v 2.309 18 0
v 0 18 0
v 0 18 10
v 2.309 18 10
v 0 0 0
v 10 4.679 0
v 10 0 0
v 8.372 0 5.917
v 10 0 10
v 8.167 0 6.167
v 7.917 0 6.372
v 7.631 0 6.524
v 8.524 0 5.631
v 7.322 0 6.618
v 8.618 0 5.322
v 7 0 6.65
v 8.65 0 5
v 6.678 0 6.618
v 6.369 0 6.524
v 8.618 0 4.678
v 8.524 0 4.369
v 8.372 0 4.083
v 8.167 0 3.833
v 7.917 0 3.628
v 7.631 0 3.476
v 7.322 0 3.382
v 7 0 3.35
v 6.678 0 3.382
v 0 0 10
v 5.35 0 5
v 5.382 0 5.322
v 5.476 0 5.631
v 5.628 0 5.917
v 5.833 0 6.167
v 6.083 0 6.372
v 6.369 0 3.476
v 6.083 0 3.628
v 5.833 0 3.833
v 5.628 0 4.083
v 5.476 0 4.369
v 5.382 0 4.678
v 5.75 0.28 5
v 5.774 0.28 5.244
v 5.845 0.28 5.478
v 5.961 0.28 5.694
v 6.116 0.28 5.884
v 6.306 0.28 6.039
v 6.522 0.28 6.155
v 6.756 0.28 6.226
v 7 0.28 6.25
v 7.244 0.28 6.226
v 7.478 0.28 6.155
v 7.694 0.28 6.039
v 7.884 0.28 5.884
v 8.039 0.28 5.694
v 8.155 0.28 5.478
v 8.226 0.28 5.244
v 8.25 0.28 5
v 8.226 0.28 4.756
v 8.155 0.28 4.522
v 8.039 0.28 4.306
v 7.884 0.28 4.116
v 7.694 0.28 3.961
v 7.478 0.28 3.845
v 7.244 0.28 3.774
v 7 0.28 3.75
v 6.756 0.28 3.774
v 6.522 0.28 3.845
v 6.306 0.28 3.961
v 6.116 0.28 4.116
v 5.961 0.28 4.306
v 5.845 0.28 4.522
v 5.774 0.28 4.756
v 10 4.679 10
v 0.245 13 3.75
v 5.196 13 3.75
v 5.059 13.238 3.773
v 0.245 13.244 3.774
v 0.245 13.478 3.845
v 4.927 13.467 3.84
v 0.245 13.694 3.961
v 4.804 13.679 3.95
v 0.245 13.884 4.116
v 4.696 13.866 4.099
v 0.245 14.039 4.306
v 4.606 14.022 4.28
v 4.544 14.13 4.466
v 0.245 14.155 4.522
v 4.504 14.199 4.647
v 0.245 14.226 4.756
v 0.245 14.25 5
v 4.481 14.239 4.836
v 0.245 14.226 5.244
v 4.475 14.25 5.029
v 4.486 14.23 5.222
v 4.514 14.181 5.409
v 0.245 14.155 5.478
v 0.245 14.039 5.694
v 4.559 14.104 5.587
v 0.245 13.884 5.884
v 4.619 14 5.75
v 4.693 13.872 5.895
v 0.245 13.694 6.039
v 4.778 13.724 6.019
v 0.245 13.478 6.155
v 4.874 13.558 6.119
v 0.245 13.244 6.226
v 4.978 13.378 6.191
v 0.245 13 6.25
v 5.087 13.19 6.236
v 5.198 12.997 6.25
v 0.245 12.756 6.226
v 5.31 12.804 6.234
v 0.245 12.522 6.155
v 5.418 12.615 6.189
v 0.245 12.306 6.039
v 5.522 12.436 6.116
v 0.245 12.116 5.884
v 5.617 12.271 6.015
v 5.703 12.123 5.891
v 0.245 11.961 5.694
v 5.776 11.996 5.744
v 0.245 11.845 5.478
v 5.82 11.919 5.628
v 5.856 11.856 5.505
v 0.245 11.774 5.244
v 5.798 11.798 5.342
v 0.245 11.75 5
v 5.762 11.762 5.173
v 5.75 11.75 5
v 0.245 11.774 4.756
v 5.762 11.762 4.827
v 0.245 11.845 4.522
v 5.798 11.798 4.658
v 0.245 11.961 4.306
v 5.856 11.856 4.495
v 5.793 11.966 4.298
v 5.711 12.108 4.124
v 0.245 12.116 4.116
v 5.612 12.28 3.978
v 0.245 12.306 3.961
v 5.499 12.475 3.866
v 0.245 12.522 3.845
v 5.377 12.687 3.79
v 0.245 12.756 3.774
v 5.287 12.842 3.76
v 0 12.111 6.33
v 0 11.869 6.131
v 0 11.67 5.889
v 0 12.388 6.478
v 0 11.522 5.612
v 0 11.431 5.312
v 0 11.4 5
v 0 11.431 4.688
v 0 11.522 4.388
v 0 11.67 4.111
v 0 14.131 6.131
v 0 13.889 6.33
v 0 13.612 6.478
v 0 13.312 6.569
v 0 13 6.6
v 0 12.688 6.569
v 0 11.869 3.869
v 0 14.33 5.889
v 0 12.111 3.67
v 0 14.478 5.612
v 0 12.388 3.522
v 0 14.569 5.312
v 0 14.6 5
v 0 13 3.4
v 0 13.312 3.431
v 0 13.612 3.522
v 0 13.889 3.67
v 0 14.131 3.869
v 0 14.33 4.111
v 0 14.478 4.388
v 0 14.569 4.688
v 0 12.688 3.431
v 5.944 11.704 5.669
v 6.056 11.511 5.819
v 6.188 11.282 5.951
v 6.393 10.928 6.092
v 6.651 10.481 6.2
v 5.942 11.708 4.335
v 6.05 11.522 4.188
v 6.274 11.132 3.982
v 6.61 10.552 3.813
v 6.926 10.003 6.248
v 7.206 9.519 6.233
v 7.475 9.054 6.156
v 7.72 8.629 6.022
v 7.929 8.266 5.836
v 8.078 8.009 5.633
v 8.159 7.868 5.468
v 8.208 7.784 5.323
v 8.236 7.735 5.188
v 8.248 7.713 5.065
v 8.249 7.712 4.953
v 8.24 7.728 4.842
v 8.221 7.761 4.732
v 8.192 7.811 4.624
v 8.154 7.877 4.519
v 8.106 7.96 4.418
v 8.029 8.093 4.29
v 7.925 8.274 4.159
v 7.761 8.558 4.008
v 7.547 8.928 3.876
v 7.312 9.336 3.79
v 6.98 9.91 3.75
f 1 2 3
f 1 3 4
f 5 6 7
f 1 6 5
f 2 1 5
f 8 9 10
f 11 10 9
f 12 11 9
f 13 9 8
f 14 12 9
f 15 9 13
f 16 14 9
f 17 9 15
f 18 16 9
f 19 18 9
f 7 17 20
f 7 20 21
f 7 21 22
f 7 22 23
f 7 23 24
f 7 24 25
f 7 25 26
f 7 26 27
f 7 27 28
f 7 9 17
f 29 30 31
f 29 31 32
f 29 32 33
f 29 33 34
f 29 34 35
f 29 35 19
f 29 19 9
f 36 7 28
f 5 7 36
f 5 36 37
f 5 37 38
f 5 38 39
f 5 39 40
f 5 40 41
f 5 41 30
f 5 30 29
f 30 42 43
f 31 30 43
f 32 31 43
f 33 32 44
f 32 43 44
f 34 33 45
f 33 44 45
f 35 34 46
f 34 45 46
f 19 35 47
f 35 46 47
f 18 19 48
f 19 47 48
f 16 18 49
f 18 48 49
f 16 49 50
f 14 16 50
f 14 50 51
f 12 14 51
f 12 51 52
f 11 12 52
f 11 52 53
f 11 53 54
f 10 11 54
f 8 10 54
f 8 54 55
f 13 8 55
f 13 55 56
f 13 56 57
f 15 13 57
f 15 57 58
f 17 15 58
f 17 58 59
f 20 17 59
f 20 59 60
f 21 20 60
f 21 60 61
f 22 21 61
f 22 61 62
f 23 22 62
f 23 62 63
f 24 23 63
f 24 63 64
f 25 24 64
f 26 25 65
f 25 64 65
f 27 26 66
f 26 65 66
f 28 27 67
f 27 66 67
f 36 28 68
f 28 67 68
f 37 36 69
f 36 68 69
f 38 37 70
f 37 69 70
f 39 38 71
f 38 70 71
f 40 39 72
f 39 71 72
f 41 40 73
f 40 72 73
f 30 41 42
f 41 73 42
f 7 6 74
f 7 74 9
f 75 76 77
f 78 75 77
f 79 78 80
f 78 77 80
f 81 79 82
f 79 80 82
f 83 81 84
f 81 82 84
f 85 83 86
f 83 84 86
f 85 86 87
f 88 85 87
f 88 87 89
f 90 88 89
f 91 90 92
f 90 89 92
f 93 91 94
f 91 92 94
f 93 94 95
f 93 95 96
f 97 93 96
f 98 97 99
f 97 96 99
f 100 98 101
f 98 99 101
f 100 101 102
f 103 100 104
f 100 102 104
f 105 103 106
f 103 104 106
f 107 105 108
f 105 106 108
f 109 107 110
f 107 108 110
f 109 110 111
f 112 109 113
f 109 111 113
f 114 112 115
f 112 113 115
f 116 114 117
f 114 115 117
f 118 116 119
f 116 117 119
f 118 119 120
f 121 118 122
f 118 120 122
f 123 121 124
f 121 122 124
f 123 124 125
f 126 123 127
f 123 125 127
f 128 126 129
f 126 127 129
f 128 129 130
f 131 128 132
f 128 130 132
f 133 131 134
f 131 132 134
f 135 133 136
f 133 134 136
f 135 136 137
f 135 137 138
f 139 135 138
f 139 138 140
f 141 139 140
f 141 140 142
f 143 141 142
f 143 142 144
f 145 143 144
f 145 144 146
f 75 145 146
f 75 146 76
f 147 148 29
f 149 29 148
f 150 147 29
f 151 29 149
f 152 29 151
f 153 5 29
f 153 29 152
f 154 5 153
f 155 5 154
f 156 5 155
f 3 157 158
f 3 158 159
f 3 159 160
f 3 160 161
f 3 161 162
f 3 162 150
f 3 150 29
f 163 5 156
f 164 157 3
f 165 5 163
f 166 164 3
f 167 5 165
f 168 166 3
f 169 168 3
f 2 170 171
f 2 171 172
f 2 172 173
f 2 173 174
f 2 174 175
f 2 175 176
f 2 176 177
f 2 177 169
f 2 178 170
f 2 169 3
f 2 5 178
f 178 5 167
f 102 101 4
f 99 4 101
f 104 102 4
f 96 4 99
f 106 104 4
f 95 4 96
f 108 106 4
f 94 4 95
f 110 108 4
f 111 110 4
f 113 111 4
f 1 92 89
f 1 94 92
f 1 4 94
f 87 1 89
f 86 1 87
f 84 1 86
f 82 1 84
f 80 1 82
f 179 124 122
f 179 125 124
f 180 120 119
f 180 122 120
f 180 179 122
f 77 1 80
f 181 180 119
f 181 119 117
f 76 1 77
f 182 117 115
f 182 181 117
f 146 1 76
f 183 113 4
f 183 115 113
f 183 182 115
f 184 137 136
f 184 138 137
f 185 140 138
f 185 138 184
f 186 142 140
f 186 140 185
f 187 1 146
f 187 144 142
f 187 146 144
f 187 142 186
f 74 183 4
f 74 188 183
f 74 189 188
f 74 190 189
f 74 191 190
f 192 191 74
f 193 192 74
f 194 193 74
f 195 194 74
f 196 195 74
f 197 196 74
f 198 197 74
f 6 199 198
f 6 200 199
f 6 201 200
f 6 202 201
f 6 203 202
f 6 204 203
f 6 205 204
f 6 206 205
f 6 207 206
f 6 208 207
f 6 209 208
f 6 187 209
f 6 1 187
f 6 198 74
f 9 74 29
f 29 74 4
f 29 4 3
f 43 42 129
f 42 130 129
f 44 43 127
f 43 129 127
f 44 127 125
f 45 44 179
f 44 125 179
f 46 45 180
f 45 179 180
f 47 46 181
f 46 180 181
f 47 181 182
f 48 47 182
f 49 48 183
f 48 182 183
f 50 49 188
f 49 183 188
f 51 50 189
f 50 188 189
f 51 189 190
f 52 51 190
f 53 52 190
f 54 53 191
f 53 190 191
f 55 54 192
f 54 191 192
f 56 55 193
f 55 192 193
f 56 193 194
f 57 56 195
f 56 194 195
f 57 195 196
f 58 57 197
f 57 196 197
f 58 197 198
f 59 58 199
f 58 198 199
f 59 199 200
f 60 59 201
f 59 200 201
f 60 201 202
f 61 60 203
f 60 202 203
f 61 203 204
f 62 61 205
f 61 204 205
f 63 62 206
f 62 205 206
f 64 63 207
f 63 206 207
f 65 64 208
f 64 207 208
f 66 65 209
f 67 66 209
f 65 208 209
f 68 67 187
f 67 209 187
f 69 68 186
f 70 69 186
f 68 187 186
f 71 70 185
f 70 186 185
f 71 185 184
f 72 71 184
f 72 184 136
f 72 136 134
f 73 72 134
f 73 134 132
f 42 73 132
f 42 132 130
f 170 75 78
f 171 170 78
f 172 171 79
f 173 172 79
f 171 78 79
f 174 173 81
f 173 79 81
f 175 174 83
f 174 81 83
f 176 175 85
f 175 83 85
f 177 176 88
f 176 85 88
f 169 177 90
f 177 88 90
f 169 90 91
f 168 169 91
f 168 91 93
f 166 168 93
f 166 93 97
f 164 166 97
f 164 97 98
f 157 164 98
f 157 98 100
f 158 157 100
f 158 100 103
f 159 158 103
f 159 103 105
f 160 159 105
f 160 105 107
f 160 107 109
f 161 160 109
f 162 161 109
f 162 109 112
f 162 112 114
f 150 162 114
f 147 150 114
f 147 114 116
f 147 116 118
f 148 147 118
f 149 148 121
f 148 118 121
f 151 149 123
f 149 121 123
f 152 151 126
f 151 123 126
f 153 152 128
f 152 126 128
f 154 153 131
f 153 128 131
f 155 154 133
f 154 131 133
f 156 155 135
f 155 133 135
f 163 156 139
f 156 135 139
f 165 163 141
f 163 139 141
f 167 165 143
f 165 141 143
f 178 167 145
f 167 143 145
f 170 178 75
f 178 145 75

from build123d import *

# Parameters (mm, degrees)
EXTRUDE_1_DEPTH             = 10
HOLE_WIZARD_M31_D           = 2.5
HOLE_WIZARD_M31_CSINK_D     = 3.2
HOLE_WIZARD_M31_CSINK_ANGLE = 110
HOLE_WIZARD_M32_D           = 2.5
HOLE_WIZARD_M32_CSINK_D     = 3.3
HOLE_WIZARD_M32_CSINK_ANGLE = 110


with BuildPart() as part:
    # Эскиз1 → Бобышка-Вытянуть1 (new body)
    with BuildSketch(Plane.XY):
        Polygon((0, 0), (0, 18), (2.309401077, 18), (10, 4.679491924), (10, 0), align=None)
    extrude(amount=EXTRUDE_1_DEPTH)

    # Отверстие обработанное метчиком M31 (through all)
    with Locations(Plane.ZY):
        with Locations((5, 13)):
            CounterSinkHole(HOLE_WIZARD_M31_D / 2, HOLE_WIZARD_M31_CSINK_D / 2, counter_sink_angle=HOLE_WIZARD_M31_CSINK_ANGLE)

    # Отверстие обработанное метчиком M32 (through all)
    with Locations(Plane.XZ):
        with Locations((7, 5)):
            CounterSinkHole(HOLE_WIZARD_M32_D / 2, HOLE_WIZARD_M32_CSINK_D / 2, counter_sink_angle=HOLE_WIZARD_M32_CSINK_ANGLE)


solid = part.part
